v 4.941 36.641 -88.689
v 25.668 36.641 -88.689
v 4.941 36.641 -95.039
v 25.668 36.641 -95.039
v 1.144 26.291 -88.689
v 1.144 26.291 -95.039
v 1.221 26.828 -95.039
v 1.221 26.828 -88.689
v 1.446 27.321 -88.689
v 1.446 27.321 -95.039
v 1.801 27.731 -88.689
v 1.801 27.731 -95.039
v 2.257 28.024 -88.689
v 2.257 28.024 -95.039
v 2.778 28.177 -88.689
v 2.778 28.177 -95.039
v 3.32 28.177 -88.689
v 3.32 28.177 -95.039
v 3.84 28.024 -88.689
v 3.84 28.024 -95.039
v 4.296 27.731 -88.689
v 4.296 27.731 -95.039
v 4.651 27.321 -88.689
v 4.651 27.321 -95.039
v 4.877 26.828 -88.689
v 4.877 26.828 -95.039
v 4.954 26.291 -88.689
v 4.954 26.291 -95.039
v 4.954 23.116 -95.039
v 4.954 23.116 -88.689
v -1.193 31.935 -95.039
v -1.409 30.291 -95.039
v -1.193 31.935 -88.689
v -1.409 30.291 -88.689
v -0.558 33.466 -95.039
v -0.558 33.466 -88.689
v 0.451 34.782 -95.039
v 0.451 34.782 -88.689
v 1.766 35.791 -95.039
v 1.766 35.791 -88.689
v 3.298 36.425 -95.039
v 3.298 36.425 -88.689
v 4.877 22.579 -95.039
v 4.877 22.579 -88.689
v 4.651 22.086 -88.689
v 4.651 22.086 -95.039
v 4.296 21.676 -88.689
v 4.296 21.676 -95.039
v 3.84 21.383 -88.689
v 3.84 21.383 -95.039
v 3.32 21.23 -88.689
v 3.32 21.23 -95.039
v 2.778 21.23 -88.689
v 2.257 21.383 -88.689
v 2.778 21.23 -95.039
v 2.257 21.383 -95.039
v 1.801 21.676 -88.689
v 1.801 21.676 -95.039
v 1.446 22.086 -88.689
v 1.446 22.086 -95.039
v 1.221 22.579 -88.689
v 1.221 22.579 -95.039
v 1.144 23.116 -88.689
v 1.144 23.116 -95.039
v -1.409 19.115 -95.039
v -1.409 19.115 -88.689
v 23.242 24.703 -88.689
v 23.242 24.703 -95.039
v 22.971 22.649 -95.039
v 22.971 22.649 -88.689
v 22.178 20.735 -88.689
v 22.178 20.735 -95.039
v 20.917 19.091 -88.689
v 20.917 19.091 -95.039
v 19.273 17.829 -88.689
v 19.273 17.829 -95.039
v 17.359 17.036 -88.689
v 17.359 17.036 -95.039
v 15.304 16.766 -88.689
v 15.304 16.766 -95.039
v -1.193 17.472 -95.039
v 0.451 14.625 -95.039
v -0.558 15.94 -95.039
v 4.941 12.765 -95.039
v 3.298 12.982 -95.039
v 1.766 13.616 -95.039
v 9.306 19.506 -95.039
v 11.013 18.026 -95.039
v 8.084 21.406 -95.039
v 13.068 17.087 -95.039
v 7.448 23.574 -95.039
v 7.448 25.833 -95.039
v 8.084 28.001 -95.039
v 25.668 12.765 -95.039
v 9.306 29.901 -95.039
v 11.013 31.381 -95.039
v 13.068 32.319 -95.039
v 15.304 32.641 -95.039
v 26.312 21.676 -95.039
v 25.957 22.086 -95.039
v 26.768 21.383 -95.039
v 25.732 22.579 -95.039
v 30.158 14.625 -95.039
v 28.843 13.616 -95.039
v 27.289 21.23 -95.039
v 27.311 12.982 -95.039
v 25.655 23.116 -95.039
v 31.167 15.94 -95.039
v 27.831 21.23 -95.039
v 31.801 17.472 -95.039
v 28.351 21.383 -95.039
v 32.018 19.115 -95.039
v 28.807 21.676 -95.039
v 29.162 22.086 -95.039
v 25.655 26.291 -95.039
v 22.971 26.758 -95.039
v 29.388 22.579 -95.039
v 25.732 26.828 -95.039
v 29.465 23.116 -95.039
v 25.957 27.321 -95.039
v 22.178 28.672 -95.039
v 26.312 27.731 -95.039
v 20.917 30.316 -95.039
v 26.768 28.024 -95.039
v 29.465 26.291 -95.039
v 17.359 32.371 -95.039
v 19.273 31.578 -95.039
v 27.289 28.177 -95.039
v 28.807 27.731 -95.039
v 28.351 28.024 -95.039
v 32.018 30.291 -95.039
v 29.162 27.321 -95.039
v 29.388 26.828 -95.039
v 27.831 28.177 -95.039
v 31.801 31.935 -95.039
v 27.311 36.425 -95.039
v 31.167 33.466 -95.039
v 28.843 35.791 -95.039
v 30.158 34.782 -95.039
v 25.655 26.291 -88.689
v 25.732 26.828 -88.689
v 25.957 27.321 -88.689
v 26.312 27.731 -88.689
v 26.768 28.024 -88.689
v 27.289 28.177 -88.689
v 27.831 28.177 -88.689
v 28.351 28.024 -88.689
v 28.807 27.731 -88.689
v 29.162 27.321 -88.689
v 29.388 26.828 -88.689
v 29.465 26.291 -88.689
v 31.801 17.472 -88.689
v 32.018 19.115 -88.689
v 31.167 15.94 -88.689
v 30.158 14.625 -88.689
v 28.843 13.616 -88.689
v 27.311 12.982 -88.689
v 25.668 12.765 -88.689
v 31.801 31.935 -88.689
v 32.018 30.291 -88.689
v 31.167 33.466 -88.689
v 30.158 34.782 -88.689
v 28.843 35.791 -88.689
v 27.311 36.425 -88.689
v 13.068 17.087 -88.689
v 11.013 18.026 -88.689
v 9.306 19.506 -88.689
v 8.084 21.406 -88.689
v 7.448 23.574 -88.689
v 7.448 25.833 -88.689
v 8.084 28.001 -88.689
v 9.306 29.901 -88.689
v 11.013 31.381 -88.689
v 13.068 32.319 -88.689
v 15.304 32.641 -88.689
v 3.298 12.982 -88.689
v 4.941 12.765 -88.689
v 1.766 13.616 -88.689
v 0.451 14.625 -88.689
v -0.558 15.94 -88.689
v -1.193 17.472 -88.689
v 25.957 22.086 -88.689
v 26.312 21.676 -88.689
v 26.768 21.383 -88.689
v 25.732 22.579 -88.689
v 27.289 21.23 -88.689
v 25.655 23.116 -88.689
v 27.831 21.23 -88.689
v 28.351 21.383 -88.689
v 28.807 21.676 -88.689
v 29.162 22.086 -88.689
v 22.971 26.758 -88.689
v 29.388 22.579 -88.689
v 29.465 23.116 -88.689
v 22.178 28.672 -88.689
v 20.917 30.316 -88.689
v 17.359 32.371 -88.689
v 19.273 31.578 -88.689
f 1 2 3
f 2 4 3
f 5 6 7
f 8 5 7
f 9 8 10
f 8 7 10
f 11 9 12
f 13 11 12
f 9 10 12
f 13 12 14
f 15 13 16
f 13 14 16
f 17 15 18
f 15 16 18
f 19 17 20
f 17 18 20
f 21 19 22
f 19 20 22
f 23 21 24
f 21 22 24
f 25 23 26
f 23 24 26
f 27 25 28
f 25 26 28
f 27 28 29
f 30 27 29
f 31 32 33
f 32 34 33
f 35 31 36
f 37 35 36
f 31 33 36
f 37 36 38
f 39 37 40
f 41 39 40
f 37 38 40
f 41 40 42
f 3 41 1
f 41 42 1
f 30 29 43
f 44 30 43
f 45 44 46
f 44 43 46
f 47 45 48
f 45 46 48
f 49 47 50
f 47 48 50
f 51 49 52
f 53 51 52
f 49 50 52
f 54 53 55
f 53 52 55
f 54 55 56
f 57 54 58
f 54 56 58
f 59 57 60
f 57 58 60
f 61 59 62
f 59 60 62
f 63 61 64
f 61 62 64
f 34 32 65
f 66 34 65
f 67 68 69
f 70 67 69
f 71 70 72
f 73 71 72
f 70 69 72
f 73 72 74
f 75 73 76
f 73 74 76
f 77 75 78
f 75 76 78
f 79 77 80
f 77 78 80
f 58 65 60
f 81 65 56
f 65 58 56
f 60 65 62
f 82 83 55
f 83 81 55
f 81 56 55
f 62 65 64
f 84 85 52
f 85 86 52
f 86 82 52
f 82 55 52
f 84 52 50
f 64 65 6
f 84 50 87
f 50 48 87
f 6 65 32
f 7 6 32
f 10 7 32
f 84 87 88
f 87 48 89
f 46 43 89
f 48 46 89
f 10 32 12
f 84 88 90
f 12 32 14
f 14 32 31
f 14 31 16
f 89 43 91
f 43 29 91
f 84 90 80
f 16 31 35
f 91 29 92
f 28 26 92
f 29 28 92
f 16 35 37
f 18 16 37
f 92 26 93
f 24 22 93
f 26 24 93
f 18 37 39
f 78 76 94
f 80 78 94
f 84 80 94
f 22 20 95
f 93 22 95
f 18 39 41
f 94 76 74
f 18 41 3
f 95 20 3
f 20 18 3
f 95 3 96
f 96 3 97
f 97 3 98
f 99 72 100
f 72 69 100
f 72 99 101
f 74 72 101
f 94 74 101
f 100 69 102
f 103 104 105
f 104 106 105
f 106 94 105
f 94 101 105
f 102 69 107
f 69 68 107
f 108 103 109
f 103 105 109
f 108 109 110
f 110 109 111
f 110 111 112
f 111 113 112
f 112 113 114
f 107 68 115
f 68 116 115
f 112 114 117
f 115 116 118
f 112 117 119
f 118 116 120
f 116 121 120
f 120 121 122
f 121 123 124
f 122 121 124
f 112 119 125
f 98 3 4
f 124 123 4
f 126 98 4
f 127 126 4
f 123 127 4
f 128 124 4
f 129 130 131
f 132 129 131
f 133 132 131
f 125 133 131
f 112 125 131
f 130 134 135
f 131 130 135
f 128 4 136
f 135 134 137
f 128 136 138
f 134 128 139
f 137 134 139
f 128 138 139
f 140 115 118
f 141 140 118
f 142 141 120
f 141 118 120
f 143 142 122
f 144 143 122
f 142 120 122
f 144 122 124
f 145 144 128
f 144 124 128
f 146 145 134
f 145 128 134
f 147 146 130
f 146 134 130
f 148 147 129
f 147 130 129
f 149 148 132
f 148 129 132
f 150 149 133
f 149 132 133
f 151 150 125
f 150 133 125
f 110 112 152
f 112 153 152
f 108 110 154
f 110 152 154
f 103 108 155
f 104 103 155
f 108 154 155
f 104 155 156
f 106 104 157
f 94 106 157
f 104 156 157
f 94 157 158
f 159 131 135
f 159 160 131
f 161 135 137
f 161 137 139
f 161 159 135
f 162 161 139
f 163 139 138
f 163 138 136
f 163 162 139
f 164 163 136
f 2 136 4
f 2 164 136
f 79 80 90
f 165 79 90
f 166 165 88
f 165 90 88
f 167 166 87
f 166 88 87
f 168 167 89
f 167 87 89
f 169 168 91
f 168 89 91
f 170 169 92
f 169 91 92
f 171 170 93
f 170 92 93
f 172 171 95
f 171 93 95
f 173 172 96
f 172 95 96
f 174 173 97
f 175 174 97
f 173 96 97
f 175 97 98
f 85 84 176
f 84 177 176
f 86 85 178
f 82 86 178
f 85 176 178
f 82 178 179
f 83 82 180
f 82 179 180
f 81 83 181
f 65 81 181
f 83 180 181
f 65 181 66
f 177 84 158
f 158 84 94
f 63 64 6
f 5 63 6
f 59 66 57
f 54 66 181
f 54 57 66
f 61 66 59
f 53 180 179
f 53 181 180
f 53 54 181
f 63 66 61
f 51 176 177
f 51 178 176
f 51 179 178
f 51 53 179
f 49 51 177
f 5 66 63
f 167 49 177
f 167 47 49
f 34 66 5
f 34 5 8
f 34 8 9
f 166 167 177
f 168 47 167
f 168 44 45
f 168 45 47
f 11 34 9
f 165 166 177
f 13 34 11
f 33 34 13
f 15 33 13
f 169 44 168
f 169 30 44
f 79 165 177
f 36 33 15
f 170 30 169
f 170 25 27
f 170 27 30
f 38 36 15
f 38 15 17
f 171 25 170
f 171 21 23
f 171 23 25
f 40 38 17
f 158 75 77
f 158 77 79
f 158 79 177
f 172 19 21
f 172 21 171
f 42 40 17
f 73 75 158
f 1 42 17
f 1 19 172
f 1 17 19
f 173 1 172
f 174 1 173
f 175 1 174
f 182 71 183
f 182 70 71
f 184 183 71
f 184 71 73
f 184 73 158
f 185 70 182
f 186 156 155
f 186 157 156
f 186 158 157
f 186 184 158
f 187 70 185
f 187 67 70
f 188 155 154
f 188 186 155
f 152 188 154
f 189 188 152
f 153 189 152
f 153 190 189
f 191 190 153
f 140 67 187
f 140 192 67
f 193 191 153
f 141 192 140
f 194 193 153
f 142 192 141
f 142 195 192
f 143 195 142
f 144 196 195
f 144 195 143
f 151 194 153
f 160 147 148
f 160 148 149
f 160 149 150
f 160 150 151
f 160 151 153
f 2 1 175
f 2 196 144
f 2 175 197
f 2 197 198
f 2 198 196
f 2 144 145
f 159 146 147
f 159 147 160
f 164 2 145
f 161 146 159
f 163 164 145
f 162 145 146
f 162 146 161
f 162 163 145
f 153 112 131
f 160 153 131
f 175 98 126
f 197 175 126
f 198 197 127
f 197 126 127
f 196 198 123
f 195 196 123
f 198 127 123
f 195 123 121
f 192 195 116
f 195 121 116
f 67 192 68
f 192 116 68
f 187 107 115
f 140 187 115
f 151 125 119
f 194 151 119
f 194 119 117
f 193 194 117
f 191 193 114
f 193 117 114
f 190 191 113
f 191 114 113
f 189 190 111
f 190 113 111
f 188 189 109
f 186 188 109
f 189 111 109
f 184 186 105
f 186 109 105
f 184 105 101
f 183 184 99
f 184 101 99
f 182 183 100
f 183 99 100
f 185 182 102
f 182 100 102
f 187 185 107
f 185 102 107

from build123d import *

# Parameters (mm, degrees)
BOSS_EXTRUDE1_DEPTH = 6.35
FILLET1_R           = 6.35


with BuildPart() as part:
    # Sketch1 → Boss-Extrude1 (new body)
    # profile 1 of 6: a face of its own
    with BuildSketch(Plane.XY.offset(-95.039403682)):
        with BuildLine():
            ThreePointArc((15.304322218, 15.940467802), (6.541322218, 24.703467802), (15.304322218, 33.466467802))
            Line((15.304322218, 33.466467802), (15.304322218, 36.641467802))
            Line((15.304322218, 36.641467802), (-1.408877782, 36.641467802))
            Line((-1.408877782, 36.641467802), (-1.408877782, 12.765467802))
            Line((-1.408877782, 12.765467802), (15.304322218, 12.765467802))
            Line((15.304322218, 12.765467802), (15.304322218, 15.940467802))
        make_face()
        with BuildLine():
            Line((1.143822218, 23.115967802), (1.143822218, 26.290967802))
            ThreePointArc((1.143822218, 26.290967802), (3.048822218, 28.195967802), (4.953822218, 26.290967802))
            Line((4.953822218, 26.290967802), (4.953822218, 23.115967802))
            ThreePointArc((4.953822218, 23.115967802), (3.048822218, 21.210967802), (1.143822218, 23.115967802))
        make_face(mode=Mode.SUBTRACT)
    # profile 2 of 6: a face of its own
    with BuildSketch(Plane.XY.offset(-95.039403682)):
        with BuildLine():
            Line((15.304322218, 36.641467802), (15.304322218, 33.466467802))
            ThreePointArc((15.304322218, 33.466467802), (21.500698942, 30.899844525), (24.067322218, 24.703467802))
            ThreePointArc((24.067322218, 24.703467802), (21.500698942, 18.507091078), (15.304322218, 15.940467802))
            Line((15.304322218, 15.940467802), (15.304322218, 12.765467802))
            Line((15.304322218, 12.765467802), (32.017522218, 12.765467802))
            Line((32.017522218, 12.765467802), (32.017522218, 36.641467802))
            Line((32.017522218, 36.641467802), (15.304322218, 36.641467802))
        make_face()
        with BuildLine():
            Line((25.654822218, 23.115967802), (25.654822218, 26.290967802))
            ThreePointArc((25.654822218, 26.290967802), (27.559822218, 28.195967802), (29.464822218, 26.290967802))
            Line((29.464822218, 26.290967802), (29.464822218, 23.115967802))
            ThreePointArc((29.464822218, 23.115967802), (27.559822218, 21.210967802), (25.654822218, 23.115967802))
        make_face(mode=Mode.SUBTRACT)
    # profile 3 of 6: a face of its own
    with BuildSketch(Plane.XY.offset(-95.039403682)):
        with BuildLine():
            ThreePointArc((15.304322218, 16.765967802), (7.366822218, 24.703467802), (15.304322218, 32.640967802))
            Line((15.304322218, 32.640967802), (15.304322218, 33.466467802))
            ThreePointArc((15.304322218, 33.466467802), (6.541322218, 24.703467802), (15.304322218, 15.940467802))
            Line((15.304322218, 15.940467802), (15.304322218, 16.765967802))
        make_face()
    # profile 4 of 6: a face of its own
    with BuildSketch(Plane.XY.offset(-95.039403682)):
        with BuildLine():
            Line((15.304322218, 33.466467802), (15.304322218, 32.640967802))
            ThreePointArc((15.304322218, 32.640967802), (20.916982294, 30.316127877), (23.241822218, 24.703467802))
            ThreePointArc((23.241822218, 24.703467802), (20.916982294, 19.090807726), (15.304322218, 16.765967802))
            Line((15.304322218, 16.765967802), (15.304322218, 15.940467802))
            ThreePointArc((15.304322218, 15.940467802), (21.500698942, 18.507091078), (24.067322218, 24.703467802))
            ThreePointArc((24.067322218, 24.703467802), (21.500698942, 30.899844525), (15.304322218, 33.466467802))
        make_face()
    # profile 5 of 6: a face of its own
    with BuildSketch(Plane.XY.offset(-95.039403682)):
        with BuildLine():
            ThreePointArc((15.304322218, 16.765967802), (7.366822218, 24.703467802), (15.304322218, 32.640967802))
            Line((15.304322218, 32.640967802), (15.304322218, 33.466467802))
            ThreePointArc((15.304322218, 33.466467802), (6.541322218, 24.703467802), (15.304322218, 15.940467802))
            Line((15.304322218, 15.940467802), (15.304322218, 16.765967802))
        make_face()
    # profile 6 of 6: a face of its own
    with BuildSketch(Plane.XY.offset(-95.039403682)):
        with BuildLine():
            Line((15.304322218, 33.466467802), (15.304322218, 32.640967802))
            ThreePointArc((15.304322218, 32.640967802), (20.916982294, 30.316127877), (23.241822218, 24.703467802))
            ThreePointArc((23.241822218, 24.703467802), (20.916982294, 19.090807726), (15.304322218, 16.765967802))
            Line((15.304322218, 16.765967802), (15.304322218, 15.940467802))
            ThreePointArc((15.304322218, 15.940467802), (21.500698942, 18.507091078), (24.067322218, 24.703467802))
            ThreePointArc((24.067322218, 24.703467802), (21.500698942, 30.899844525), (15.304322218, 33.466467802))
        make_face()
    extrude(amount=BOSS_EXTRUDE1_DEPTH)

    # Fillet1
    fillet1_edges = [part.edges().sort_by_distance(p)[0] for p in [
        (32.017522218, 12.765467802, -91.864403682),
        (-1.408877782, 12.765467802, -91.864403682),
        (-1.408877782, 36.641467802, -91.864403682),
        (32.017522218, 36.641467802, -91.864403682),
    ]]
    fillet(fillet1_edges, radius=FILLET1_R)


solid = part.part
